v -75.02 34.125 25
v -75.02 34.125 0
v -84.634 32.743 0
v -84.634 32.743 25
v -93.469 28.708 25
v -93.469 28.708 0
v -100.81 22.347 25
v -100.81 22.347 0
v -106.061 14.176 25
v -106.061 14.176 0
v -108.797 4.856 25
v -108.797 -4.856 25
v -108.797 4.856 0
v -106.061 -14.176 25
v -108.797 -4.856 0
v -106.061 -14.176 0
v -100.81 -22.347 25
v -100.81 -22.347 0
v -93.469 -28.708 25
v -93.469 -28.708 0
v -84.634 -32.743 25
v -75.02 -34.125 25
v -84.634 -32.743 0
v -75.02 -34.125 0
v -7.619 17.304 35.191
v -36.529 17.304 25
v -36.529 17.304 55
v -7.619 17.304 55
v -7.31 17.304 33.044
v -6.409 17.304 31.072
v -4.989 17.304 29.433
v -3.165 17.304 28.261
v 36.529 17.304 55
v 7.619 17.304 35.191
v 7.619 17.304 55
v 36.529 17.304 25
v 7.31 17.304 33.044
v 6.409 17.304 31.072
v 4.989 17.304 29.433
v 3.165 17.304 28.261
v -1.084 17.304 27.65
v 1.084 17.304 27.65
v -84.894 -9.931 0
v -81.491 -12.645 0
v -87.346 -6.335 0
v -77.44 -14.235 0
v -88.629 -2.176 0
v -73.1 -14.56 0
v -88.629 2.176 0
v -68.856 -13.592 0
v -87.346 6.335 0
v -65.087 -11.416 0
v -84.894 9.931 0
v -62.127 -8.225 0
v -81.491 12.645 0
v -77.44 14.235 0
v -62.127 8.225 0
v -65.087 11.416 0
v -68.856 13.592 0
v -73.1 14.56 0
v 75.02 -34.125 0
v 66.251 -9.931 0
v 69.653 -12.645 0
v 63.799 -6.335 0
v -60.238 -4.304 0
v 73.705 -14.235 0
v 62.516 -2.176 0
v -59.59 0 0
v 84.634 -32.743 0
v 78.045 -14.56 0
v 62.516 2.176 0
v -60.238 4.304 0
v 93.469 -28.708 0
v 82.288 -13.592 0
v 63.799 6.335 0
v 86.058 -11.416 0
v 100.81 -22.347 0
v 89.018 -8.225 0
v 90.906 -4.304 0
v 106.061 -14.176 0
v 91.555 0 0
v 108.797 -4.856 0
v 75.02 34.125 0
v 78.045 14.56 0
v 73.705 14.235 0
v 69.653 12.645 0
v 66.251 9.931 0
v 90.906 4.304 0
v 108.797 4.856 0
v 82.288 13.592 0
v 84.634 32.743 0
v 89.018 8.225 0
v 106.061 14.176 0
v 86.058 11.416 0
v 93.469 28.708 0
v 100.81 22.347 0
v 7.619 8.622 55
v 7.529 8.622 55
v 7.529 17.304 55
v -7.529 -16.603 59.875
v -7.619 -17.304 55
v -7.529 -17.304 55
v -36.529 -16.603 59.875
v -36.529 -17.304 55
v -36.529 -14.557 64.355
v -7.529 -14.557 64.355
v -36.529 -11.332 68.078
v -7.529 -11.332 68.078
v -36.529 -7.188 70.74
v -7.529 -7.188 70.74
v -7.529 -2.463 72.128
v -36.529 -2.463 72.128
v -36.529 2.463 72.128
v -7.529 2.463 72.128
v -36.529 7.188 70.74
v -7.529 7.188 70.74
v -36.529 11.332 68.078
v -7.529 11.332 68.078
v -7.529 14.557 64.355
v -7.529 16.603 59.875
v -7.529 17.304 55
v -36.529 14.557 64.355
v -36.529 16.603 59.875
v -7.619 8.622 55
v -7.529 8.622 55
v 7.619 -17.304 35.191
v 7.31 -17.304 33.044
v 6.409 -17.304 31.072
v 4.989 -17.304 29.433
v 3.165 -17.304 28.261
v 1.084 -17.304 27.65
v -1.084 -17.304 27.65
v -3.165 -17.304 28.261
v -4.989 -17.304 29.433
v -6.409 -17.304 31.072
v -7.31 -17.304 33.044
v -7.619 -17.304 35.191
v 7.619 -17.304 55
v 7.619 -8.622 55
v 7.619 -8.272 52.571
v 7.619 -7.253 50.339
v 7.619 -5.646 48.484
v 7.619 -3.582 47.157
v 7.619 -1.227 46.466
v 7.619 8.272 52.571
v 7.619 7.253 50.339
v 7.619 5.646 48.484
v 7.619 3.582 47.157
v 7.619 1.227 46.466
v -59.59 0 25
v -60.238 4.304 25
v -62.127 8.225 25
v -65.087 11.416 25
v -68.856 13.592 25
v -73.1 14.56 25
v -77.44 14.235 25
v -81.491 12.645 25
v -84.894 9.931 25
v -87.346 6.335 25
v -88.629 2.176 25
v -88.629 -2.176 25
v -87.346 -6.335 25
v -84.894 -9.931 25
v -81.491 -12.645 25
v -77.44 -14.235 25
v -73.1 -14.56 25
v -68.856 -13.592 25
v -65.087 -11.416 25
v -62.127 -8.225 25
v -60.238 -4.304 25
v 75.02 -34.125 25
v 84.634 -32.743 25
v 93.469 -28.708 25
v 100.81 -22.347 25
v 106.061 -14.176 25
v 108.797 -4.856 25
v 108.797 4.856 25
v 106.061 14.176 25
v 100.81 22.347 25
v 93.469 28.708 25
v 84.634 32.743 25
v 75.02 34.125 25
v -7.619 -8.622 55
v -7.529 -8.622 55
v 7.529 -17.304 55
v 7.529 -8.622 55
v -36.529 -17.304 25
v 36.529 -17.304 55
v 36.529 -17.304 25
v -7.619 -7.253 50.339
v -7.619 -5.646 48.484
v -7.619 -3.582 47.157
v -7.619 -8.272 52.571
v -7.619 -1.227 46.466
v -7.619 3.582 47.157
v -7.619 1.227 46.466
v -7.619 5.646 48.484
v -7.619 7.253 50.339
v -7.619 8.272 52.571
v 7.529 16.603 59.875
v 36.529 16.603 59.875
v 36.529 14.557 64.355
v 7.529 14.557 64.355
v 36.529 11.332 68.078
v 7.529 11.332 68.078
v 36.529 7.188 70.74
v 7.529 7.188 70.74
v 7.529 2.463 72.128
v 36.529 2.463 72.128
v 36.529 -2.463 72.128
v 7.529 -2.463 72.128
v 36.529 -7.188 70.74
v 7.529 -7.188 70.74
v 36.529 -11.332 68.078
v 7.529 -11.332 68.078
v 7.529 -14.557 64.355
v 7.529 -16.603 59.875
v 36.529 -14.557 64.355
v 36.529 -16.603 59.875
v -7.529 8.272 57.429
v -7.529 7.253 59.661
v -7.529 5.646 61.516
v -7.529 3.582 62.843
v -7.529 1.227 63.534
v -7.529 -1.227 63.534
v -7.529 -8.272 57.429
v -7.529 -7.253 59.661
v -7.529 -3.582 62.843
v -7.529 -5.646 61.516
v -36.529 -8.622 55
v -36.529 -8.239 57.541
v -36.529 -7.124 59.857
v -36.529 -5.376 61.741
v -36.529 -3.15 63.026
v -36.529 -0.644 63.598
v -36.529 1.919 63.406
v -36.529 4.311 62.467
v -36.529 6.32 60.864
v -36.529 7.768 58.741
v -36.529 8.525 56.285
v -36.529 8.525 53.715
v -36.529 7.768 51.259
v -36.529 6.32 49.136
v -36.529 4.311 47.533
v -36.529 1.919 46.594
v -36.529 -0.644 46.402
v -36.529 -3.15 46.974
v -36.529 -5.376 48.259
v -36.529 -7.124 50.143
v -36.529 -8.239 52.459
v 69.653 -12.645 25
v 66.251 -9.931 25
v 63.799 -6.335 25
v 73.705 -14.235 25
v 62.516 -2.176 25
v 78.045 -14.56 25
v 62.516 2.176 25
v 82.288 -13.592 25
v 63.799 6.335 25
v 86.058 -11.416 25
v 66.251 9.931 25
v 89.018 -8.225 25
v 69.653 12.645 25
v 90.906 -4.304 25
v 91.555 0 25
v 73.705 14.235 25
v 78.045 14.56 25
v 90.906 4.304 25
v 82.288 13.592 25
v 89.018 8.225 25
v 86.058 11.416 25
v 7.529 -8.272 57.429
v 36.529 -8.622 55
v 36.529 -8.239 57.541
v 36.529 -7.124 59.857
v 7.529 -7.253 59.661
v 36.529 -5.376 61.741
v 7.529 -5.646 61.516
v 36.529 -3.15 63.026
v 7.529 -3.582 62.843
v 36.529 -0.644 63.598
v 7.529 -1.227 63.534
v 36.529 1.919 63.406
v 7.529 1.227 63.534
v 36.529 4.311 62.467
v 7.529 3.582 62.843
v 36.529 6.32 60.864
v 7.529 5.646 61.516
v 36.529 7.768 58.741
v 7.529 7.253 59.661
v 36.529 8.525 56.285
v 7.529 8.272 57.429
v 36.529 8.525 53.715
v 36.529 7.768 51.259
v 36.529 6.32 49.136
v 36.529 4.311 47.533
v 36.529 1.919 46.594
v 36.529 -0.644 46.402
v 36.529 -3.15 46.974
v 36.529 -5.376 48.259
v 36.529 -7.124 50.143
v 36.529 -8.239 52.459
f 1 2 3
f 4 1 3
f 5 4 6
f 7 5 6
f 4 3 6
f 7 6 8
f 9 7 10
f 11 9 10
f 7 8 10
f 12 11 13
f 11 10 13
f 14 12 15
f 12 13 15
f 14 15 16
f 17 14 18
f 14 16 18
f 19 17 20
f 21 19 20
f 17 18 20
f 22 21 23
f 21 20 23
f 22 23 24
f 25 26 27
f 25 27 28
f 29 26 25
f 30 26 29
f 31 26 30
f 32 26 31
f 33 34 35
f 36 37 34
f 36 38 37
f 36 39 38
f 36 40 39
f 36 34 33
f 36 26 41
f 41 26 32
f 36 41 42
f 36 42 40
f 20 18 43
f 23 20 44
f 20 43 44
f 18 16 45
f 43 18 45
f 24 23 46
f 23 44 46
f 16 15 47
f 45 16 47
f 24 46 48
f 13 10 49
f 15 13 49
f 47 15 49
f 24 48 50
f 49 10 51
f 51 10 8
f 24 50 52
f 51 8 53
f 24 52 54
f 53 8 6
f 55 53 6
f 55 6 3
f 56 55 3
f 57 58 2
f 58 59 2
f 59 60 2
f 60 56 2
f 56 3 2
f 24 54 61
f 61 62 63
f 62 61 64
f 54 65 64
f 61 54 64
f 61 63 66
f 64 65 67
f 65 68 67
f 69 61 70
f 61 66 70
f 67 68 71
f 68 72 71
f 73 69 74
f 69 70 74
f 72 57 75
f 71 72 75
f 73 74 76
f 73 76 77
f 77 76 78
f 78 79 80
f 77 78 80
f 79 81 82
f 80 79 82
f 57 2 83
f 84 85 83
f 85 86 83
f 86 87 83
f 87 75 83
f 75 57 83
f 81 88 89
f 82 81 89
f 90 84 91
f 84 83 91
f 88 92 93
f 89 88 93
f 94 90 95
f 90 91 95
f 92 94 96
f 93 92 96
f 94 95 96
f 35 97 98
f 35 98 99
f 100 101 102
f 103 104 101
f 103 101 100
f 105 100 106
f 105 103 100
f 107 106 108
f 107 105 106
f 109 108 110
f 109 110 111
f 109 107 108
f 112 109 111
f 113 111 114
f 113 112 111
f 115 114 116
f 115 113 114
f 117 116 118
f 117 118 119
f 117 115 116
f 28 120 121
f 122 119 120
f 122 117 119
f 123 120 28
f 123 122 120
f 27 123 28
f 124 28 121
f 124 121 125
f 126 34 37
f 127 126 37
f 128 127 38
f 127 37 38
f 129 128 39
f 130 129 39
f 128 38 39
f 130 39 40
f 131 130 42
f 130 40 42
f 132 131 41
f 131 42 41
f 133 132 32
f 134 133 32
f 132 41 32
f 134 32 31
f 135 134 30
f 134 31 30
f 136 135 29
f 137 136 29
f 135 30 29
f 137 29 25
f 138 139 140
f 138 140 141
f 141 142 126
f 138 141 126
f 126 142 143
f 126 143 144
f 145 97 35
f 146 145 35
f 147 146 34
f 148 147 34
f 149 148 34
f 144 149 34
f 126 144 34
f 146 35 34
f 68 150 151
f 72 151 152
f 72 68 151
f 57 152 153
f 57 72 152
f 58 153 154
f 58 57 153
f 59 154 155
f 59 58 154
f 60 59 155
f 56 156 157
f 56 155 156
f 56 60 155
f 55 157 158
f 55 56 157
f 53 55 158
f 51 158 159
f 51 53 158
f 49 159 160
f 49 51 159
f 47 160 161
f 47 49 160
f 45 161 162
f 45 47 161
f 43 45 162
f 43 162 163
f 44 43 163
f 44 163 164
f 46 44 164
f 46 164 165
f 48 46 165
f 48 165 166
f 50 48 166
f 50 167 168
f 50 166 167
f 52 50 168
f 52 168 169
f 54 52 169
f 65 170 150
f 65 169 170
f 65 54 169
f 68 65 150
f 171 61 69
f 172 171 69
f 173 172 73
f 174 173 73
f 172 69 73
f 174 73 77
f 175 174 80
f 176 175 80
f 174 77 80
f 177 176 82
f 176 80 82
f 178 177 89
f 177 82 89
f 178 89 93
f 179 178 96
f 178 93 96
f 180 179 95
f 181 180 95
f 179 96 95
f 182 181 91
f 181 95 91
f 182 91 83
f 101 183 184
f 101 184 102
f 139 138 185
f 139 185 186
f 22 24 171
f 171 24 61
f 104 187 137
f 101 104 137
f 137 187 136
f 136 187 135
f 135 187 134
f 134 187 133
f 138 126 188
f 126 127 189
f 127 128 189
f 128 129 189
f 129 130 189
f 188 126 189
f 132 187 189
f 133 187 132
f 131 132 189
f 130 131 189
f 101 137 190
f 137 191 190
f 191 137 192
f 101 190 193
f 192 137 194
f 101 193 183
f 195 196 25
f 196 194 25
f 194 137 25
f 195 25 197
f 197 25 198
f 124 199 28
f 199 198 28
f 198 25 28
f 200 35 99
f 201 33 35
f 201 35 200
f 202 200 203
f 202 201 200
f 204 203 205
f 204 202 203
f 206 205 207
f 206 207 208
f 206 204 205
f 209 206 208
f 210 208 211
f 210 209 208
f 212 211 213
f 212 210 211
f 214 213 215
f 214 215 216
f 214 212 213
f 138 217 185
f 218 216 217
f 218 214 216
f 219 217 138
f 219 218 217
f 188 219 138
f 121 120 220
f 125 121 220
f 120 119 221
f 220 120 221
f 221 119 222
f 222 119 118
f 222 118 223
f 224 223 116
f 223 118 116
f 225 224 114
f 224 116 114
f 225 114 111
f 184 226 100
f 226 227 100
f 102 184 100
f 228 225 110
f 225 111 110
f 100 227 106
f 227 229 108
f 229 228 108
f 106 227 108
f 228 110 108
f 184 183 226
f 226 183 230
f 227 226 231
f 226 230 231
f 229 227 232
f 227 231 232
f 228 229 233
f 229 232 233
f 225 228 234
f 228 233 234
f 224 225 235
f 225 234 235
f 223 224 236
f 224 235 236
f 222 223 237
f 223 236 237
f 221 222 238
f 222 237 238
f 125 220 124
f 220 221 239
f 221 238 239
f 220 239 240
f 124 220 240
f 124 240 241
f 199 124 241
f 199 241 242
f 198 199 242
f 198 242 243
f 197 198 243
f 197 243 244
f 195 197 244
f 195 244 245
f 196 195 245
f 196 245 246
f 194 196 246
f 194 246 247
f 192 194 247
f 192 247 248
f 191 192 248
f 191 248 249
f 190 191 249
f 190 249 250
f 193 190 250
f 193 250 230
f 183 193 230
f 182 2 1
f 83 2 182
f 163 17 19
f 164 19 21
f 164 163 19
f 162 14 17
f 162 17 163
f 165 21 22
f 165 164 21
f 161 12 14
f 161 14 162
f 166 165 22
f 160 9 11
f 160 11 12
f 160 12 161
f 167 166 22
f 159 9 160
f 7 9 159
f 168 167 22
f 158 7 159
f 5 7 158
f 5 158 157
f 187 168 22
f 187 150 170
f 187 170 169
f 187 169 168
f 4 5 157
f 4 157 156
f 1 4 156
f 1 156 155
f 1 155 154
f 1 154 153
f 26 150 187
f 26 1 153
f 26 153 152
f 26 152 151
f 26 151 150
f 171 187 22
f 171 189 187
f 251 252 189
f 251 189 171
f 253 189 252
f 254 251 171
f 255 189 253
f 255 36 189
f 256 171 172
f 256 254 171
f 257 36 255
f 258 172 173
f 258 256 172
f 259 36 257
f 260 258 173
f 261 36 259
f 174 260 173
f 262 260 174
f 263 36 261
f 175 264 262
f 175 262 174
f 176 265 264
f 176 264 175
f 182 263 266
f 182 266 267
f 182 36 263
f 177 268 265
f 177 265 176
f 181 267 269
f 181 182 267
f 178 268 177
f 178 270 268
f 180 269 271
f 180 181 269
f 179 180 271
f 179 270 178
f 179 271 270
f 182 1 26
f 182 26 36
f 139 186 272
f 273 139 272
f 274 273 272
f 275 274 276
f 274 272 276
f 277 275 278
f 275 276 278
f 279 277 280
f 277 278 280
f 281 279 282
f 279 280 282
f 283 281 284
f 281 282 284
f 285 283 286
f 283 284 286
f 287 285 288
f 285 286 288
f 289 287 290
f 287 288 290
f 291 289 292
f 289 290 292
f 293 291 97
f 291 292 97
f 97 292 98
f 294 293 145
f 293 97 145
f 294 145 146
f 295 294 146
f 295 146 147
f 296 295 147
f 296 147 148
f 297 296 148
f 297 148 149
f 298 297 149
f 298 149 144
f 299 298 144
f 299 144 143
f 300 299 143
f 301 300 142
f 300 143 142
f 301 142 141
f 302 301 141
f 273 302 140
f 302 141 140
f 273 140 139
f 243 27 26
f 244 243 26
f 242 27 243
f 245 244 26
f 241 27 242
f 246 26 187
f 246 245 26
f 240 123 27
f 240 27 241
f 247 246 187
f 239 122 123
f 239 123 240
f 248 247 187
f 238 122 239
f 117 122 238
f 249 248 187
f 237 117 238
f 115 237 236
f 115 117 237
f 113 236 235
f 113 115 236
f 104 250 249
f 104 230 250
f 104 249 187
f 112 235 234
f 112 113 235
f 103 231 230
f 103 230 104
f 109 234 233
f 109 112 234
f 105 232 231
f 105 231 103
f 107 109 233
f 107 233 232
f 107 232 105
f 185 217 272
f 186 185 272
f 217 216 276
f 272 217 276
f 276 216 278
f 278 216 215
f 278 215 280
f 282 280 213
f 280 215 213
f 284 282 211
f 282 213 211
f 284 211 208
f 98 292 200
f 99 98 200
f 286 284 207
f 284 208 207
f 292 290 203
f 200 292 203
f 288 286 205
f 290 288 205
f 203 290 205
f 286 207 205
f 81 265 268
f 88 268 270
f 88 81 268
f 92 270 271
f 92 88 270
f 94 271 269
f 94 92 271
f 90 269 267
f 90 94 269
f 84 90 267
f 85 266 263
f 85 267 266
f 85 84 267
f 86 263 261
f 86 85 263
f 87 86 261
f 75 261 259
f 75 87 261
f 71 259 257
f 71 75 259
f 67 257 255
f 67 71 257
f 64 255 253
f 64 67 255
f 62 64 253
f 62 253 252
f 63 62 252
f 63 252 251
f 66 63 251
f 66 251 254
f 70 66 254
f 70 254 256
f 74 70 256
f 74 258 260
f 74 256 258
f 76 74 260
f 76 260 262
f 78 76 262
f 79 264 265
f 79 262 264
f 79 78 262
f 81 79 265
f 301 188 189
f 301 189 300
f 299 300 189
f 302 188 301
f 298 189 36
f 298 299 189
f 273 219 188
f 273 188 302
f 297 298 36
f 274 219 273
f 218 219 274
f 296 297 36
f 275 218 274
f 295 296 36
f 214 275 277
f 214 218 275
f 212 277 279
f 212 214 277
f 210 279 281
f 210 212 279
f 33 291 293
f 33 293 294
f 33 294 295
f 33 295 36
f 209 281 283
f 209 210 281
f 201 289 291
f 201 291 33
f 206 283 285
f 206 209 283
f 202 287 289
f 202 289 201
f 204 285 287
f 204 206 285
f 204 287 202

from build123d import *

# Parameters (mm, degrees)
F0_W      = 150.0394791365
F0_H      = 68.2500004768
F1_DEPTH  = 25
F2_R      = 14.6010069538
F2_R_2    = 14.601
F3_DEPTH  = 86
F4_W      = 73.0581060052
F4_H      = 34.6081331372
F5_DEPTH  = 30
F7_DEPTH  = 50
F9_DEPTH  = 29
F11_DEPTH = 29
F12_R     = 8.621691767
F13_DEPTH = 110.5


# Not quite as in the source:
# - a feature names something its author has since deleted; it is built from what else it names


with BuildPart() as f1:
    # F0 (on Top) → F1 (new body)
    with BuildSketch(Plane.XY):
        Rectangle(F0_W, F0_H)
        with BuildLine():
            Line((-75.0197395682, -34.1250002384), (-75.0197395682, 34.1250002384))
            ThreePointArc((-75.0197395682, 34.1250002384), (-109.1447398067, 0), (-75.0197395682, -34.1250002384))
        make_face()
        with BuildLine():
            ThreePointArc((75.0197395682, -34.1250002384), (109.1447398067, 0), (75.0197395682, 34.1250002384))
            Line((75.0197395682, 34.1250002384), (75.0197395682, -34.1250002384))
        make_face()
    extrude(amount=F1_DEPTH)

    # F2 (on Top) → F3 (cut)
    with BuildSketch(Plane.XY):
        with Locations((-74.1907954216, 0)):
            Circle(F2_R)
        with Locations((76.9539475441, 0)):
            Circle(F2_R_2)
    extrude(amount=F3_DEPTH, mode=Mode.SUBTRACT)

    # F4 (on face) → F5 (join)
    with BuildSketch(Plane.XY.offset(25)):
        Rectangle(F4_W, F4_H)
    extrude(amount=F5_DEPTH)

    # F6 (on face) → F7 (cut)
    with BuildSketch(Plane(origin=(0, 17.3040665686, 0), x_dir=(-1, 0, 0), z_dir=(0, 1, 0))):
        with BuildLine():
            ThreePointArc((-7.6186316787, 35.1906841607), (0, 27.572052482), (7.6186316787, 35.1906841607))
            Line((7.6186316787, 35.1906841607), (-7.6186316787, 35.1906841607))
        make_face()
        with BuildLine():
            Line((-7.6186316787, 35.1906841607), (7.6186316787, 35.1906841607))
            ThreePointArc((7.6186316787, 35.1906841607), (0, 42.8093158393), (-7.6186316787, 35.1906841607))
        make_face()
        with BuildLine():
            ThreePointArc((-7.6186316787, 35.1906841607), (0, 42.8093158393), (7.6186316787, 35.1906841607))
            Line((7.6186316787, 35.1906841607), (7.6186316787, 55))
            Line((7.6186316787, 55), (-7.6186316787, 55))
            Line((-7.6186316787, 55), (-7.6186316787, 35.1906841607))
        make_face()
    extrude(amount=-F7_DEPTH, mode=Mode.SUBTRACT)

    # F8 (on face) → F9 (join)
    with BuildSketch(Plane.YZ.offset(36.5290530026)):
        with BuildLine():
            Line((-17.3040665686, 55), (17.3040665686, 55))
            ThreePointArc((17.3040665686, 55), (0, 72.3040665686), (-17.3040665686, 55))
        make_face()
    extrude(amount=-F9_DEPTH)

    # F10 (on face) → F11 (join)
    with BuildSketch(Plane(origin=(-36.5290530026, 0, 0), x_dir=(0, -1, 0), z_dir=(-1, 0, 0))):
        with BuildLine():
            Line((-17.3040665686, 55), (17.3040665686, 55))
            ThreePointArc((17.3040665686, 55), (0, 72.3040665686), (-17.3040665686, 55))
        make_face()
    extrude(amount=-F11_DEPTH)

    # F12 (on face) → F13 (cut)
    with BuildSketch(Plane(origin=(-36.5290530026, 0, 0), x_dir=(0, -1, 0), z_dir=(-1, 0, 0))):
        with Locations((0, 55)):
            Circle(F12_R)
    extrude(amount=-F13_DEPTH, mode=Mode.SUBTRACT)


solid = f1.part
